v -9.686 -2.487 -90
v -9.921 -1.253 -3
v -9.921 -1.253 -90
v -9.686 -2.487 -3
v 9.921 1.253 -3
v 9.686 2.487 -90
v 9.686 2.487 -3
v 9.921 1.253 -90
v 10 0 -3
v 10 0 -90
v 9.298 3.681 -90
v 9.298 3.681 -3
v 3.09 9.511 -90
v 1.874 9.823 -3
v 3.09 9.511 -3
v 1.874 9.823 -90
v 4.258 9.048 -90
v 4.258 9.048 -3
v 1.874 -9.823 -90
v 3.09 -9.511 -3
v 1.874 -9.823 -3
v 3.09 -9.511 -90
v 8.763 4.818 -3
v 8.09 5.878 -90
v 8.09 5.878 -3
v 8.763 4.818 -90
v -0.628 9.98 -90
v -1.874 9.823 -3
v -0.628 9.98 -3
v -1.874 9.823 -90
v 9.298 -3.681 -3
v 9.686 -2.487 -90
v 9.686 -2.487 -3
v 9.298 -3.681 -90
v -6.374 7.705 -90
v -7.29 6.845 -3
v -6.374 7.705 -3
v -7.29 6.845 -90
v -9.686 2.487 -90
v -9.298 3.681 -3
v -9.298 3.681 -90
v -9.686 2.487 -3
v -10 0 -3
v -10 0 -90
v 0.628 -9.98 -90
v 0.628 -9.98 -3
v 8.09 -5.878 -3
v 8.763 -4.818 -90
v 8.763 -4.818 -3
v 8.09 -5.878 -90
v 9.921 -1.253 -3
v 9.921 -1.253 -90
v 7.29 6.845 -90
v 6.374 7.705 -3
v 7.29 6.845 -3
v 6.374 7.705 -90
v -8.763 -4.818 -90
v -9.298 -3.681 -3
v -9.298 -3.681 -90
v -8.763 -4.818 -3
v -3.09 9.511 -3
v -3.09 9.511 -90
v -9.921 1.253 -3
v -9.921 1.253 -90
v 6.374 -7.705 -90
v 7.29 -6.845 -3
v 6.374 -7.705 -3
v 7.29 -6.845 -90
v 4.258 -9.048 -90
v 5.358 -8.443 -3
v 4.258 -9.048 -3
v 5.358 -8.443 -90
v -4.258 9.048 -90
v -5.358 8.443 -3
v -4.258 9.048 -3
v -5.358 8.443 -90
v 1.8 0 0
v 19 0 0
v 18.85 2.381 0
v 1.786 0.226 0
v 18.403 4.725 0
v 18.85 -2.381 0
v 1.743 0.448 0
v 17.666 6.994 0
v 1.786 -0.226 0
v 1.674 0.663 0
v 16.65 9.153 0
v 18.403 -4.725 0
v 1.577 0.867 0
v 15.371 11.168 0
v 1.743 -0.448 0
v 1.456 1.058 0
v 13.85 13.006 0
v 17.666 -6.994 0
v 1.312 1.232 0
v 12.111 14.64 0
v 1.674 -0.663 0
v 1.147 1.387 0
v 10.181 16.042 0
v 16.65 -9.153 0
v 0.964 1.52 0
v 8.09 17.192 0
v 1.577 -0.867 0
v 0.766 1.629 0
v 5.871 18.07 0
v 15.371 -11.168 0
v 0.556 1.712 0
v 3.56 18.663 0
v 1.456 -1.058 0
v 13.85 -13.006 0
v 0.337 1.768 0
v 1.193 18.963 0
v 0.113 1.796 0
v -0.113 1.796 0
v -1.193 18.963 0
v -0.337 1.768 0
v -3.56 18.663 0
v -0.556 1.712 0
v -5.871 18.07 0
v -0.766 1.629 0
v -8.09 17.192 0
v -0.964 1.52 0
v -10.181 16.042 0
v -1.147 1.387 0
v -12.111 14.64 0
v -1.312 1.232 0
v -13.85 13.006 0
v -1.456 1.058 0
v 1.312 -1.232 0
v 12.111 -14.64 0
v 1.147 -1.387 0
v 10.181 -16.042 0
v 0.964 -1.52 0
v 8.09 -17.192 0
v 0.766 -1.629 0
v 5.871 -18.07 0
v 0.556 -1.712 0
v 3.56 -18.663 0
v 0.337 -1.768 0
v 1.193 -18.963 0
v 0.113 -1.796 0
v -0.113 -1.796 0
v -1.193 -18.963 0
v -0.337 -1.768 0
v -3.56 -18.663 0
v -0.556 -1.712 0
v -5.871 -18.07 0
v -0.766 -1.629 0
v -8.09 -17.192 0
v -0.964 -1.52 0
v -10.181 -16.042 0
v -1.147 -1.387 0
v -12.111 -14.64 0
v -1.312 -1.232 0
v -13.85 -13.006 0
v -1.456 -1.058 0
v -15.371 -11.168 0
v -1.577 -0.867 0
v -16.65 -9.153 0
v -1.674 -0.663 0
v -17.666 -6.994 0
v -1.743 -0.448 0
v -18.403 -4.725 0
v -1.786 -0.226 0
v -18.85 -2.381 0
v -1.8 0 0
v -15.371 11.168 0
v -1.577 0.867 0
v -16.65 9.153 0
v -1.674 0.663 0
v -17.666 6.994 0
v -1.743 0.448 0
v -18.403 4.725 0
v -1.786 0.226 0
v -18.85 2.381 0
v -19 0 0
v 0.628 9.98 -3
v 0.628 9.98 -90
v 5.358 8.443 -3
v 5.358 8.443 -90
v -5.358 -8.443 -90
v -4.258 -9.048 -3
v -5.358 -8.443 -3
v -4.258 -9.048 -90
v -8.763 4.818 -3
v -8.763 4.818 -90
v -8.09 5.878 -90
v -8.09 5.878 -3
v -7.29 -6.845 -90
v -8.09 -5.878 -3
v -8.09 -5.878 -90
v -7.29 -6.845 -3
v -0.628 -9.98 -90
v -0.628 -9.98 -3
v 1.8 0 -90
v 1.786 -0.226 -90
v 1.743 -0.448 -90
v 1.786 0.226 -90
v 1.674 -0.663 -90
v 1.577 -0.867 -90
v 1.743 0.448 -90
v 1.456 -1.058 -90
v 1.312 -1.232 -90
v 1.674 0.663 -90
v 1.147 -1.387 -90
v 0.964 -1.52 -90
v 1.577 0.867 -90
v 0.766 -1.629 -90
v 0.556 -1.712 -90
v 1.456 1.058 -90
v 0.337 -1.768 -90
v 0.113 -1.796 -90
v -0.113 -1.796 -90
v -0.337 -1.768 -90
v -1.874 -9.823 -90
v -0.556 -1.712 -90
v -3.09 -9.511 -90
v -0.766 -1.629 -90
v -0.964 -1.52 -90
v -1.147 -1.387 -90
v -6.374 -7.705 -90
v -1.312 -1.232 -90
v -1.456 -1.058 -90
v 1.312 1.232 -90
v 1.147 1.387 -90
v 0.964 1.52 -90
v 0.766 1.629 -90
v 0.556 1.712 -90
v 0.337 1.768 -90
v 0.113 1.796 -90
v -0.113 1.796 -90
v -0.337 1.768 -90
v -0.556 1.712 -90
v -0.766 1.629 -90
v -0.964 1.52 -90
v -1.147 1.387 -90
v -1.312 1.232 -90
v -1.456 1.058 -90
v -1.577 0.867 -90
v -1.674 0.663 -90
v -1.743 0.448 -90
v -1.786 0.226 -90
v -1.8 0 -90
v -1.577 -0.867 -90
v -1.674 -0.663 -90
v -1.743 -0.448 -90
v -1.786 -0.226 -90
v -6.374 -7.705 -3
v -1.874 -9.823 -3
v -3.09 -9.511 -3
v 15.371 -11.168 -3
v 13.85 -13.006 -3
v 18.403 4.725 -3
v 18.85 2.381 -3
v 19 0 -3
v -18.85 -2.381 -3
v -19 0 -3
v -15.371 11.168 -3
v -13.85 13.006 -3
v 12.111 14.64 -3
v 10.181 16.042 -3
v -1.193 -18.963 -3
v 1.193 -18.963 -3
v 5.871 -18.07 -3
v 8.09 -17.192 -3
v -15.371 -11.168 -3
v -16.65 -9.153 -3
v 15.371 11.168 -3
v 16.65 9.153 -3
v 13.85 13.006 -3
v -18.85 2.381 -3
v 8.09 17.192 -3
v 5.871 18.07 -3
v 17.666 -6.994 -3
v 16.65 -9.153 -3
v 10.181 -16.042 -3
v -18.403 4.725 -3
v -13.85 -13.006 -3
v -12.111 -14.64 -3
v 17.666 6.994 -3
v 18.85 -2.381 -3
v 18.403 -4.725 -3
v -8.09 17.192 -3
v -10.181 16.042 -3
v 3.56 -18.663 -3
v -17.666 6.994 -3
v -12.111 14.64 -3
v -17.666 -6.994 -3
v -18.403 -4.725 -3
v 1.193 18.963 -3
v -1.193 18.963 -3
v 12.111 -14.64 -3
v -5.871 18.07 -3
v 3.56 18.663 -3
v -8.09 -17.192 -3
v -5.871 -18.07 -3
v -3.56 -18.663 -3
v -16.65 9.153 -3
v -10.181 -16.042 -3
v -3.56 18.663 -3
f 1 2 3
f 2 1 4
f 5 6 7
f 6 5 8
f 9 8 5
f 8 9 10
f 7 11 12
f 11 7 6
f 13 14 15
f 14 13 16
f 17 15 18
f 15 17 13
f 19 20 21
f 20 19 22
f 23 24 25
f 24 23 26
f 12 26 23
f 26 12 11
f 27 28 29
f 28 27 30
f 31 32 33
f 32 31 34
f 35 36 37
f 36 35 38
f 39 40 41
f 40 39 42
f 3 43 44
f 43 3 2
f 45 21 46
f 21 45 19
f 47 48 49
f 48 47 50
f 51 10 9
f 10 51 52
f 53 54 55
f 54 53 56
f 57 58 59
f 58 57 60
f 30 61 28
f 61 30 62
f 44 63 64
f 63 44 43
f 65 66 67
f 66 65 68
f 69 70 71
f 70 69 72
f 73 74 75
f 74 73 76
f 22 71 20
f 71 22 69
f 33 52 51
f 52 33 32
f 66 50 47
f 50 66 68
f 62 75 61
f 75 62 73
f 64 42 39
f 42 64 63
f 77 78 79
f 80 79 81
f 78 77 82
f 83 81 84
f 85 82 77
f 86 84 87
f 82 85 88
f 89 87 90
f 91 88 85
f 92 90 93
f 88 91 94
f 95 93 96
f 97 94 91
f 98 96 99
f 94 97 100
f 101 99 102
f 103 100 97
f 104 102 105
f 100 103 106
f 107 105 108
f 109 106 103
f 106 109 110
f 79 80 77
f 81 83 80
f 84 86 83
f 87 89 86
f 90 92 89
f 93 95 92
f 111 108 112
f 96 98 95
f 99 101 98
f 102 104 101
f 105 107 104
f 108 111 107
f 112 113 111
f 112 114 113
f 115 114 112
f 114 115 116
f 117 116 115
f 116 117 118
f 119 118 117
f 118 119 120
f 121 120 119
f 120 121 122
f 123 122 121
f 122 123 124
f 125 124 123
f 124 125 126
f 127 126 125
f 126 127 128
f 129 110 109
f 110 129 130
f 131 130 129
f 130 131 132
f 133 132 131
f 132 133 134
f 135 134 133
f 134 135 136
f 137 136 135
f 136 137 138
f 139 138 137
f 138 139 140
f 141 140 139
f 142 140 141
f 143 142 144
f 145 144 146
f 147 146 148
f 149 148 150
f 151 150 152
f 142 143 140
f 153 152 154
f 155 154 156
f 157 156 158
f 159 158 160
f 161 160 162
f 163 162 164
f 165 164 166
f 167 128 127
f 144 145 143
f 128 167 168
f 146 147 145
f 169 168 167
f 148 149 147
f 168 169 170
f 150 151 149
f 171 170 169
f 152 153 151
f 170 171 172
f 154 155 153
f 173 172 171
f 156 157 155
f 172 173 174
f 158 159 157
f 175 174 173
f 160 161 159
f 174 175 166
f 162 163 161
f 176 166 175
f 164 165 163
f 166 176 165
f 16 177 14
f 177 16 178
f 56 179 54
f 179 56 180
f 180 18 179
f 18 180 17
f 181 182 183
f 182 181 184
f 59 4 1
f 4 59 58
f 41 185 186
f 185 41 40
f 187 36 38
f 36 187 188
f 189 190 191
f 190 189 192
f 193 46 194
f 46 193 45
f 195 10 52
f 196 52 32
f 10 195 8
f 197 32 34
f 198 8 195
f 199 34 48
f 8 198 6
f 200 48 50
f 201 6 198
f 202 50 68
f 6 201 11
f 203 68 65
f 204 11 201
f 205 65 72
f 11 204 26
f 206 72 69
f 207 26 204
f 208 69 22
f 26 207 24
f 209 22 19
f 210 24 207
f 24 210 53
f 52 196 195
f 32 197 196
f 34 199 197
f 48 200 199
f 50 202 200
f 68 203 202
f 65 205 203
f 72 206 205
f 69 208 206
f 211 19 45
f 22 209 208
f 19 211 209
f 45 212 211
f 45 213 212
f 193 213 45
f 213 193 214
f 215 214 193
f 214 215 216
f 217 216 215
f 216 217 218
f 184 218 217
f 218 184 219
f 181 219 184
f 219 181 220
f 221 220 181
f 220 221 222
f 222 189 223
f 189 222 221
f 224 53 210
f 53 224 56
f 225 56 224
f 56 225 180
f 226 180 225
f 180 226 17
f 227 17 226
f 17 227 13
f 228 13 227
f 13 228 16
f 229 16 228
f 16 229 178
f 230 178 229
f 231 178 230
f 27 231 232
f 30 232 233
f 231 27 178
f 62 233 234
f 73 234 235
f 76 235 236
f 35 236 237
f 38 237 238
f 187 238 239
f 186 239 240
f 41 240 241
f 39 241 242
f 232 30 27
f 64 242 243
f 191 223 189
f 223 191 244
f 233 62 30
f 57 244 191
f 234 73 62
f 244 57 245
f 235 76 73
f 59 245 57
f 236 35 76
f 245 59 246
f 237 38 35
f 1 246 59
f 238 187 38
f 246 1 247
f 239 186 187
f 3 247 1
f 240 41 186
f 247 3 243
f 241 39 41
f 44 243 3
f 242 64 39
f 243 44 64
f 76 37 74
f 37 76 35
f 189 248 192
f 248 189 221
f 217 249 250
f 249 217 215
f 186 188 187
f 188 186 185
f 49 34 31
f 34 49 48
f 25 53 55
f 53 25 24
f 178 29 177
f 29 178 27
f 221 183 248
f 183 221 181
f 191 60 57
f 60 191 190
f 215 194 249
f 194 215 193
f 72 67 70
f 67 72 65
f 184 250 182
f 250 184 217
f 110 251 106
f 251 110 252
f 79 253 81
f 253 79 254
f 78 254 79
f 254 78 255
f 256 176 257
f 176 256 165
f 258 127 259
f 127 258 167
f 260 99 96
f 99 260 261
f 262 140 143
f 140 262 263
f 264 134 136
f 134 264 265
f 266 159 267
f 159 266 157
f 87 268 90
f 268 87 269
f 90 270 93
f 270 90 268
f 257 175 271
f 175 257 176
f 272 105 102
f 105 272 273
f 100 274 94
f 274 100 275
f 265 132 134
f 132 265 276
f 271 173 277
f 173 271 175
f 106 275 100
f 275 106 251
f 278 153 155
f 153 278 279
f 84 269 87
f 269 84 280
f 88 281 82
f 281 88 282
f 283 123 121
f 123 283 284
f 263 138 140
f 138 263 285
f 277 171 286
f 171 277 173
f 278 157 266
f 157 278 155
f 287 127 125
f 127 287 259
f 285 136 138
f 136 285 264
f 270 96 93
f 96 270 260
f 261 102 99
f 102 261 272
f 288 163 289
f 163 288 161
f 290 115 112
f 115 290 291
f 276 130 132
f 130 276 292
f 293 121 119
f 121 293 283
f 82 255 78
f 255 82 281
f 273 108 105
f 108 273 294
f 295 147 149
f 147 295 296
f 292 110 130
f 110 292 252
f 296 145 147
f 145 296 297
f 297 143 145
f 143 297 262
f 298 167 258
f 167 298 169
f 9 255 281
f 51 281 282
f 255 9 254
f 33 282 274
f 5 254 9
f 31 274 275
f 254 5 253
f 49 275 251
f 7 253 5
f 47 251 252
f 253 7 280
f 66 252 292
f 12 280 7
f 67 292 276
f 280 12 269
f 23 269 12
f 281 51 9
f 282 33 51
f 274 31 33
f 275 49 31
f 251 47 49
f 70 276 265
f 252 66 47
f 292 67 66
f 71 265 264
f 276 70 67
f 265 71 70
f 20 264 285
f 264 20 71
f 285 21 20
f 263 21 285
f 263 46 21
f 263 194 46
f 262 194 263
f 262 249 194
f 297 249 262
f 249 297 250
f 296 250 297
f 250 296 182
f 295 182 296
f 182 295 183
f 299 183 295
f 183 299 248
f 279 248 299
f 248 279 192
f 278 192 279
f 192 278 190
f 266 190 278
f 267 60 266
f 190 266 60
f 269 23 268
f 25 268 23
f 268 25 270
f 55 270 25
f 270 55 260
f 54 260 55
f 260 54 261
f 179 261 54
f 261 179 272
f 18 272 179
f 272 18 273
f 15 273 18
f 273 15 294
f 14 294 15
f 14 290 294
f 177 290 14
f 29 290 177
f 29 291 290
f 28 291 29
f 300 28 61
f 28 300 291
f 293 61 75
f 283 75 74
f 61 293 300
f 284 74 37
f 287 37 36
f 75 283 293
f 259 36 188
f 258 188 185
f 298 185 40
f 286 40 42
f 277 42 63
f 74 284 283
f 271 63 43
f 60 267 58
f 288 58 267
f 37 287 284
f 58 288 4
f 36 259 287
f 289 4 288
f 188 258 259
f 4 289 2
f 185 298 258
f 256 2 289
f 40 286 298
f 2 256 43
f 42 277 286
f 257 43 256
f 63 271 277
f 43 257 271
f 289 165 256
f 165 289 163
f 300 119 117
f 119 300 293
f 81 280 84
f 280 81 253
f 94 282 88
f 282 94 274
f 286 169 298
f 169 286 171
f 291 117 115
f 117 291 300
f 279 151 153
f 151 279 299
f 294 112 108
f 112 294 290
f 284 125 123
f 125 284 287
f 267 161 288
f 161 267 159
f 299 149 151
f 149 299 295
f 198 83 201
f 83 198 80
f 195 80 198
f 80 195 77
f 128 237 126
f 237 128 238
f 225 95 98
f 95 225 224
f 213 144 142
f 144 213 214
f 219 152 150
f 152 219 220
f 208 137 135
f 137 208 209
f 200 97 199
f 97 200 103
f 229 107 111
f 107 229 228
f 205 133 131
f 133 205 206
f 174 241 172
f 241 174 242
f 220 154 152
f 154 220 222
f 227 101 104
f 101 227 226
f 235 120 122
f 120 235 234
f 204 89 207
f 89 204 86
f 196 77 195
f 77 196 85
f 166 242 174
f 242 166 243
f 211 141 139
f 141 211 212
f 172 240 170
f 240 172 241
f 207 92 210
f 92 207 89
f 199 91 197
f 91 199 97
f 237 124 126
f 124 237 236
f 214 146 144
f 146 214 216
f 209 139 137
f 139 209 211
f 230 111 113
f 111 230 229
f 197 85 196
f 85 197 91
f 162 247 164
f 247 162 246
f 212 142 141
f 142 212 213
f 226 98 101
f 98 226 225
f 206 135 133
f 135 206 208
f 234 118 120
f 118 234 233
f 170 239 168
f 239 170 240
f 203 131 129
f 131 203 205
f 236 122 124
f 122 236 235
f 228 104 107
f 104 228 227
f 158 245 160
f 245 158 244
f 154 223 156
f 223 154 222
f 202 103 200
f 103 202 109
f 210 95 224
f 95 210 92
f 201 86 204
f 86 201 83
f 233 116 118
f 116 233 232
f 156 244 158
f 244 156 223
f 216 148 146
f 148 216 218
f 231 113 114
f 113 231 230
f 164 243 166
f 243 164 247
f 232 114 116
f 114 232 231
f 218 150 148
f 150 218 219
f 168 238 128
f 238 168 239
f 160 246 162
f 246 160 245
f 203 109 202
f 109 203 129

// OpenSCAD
$fn = 50;


difference() {
	union() {
		translate(v = [0, 0, -90.0000000000]) {
			cylinder(h = 90, r = 10.0000000000);
		}
		translate(v = [0, 0, -3.0000000000]) {
			cylinder(h = 3, r = 19.0000000000);
		}
	}
	union() {
		#translate(v = [0, 0, -90]) {
			cylinder(h = 90, r = 1.8000000000);
		}
	}
}
